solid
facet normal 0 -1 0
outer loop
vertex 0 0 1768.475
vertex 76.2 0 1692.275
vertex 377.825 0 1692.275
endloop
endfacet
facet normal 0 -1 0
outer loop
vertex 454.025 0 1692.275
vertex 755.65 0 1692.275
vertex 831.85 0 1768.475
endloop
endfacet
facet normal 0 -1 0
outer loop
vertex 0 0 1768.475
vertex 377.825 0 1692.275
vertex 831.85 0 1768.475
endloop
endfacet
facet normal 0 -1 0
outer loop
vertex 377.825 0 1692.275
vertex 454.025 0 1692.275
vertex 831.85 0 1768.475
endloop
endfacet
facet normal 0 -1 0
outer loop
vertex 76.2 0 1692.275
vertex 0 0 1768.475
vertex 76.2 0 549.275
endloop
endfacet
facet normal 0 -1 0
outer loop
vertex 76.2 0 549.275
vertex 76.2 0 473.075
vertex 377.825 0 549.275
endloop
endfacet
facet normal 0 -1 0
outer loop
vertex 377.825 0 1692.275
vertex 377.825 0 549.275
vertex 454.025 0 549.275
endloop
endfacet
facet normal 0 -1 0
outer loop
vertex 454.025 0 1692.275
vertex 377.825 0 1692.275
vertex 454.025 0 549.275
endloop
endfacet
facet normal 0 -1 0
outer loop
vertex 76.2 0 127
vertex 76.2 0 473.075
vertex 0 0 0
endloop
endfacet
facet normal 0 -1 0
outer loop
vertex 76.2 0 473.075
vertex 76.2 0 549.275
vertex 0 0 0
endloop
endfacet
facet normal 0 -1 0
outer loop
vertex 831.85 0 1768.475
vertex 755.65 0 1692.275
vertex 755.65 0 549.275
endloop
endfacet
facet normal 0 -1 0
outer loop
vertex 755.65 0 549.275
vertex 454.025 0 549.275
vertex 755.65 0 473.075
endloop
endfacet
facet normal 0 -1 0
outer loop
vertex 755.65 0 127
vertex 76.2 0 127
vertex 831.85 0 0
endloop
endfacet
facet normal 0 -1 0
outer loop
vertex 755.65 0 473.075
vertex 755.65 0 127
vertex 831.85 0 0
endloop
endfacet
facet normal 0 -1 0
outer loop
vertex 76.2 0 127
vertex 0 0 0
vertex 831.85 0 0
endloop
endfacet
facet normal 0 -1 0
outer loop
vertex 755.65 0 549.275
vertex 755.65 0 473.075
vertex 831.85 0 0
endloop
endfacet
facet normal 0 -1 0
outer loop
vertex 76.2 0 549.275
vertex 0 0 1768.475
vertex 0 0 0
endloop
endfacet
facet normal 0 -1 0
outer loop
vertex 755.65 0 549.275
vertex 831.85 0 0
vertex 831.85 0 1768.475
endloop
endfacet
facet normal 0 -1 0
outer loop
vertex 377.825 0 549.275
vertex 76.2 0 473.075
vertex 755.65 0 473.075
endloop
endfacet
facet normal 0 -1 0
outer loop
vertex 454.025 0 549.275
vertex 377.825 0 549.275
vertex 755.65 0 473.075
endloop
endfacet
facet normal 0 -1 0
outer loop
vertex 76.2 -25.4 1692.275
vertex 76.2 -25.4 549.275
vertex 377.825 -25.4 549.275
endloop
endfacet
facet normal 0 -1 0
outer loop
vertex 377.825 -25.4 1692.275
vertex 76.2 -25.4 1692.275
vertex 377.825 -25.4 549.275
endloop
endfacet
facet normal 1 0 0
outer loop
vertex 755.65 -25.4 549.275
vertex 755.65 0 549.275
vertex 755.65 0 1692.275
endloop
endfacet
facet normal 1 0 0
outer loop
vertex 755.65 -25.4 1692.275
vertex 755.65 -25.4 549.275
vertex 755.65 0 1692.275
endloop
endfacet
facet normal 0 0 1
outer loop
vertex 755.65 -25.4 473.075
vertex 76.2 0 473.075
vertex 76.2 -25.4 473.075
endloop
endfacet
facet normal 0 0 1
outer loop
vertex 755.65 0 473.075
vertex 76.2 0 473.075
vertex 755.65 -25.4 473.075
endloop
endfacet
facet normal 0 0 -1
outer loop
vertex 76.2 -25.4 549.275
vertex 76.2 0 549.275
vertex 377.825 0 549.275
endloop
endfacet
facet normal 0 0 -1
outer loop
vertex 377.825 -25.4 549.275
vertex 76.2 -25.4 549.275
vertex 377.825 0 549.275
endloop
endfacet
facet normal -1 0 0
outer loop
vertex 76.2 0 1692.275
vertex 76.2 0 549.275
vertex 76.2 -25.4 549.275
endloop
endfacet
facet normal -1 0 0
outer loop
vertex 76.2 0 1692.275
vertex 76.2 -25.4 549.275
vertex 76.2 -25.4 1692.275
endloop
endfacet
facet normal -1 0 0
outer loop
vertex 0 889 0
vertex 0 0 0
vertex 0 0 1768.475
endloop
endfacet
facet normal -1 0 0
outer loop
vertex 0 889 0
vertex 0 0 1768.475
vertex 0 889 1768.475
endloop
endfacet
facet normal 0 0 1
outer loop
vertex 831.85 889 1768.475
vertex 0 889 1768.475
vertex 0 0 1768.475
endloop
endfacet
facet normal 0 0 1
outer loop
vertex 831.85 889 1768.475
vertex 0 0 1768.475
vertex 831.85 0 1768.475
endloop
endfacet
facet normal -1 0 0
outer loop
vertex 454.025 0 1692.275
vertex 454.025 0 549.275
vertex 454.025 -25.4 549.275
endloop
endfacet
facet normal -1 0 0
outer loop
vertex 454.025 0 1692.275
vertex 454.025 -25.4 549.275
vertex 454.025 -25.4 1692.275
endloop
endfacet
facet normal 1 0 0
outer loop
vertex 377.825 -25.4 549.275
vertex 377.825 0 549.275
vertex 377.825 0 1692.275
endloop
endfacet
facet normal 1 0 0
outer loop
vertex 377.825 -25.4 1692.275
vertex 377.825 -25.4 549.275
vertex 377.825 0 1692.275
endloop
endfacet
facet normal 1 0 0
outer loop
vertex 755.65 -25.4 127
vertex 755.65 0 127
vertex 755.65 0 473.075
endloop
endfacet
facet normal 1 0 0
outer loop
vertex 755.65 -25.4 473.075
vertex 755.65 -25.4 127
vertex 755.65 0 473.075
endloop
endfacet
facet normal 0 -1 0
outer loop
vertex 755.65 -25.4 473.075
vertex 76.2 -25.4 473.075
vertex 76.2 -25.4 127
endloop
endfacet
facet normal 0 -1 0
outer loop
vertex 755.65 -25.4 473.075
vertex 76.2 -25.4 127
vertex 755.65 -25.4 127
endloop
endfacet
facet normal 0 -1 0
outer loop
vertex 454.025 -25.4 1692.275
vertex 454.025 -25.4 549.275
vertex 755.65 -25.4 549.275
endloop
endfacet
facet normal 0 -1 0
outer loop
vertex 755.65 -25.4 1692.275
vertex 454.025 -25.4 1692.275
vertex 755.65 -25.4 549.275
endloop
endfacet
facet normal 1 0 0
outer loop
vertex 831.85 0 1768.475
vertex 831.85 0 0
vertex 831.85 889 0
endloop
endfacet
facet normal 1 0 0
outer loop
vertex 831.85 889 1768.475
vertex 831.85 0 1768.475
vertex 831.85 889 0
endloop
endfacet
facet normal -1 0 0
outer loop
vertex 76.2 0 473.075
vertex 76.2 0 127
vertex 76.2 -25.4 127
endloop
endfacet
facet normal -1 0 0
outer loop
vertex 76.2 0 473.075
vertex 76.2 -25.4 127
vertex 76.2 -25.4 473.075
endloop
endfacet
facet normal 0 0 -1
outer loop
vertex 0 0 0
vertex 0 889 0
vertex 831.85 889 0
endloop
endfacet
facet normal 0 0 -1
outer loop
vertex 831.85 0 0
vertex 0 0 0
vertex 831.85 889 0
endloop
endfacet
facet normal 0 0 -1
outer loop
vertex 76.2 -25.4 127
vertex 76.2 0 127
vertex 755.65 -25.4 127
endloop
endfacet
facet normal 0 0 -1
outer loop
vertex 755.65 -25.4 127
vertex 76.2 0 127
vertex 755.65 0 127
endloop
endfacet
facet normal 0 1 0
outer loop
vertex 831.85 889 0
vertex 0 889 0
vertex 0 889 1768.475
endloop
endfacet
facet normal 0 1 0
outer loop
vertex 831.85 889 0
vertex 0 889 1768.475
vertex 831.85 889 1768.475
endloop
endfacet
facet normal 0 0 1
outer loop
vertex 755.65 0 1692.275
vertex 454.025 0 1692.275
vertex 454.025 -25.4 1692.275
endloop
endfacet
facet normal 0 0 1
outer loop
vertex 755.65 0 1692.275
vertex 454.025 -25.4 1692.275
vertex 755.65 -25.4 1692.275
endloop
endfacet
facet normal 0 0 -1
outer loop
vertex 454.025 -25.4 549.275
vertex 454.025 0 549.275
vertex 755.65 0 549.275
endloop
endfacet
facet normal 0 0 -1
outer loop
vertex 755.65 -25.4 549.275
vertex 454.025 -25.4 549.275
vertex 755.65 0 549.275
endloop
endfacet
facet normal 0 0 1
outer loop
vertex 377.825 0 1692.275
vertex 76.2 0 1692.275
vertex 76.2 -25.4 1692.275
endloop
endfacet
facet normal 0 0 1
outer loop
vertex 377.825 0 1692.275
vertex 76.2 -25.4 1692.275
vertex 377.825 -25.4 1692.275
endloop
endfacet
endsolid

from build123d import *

# Parameters (mm, degrees)
F0_W     = 831.85
F0_H     = 889
F1_DEPTH = 1768.475
F2_W     = 301.625
F2_H     = 1143
F2_W_2   = 679.45
F2_H_2   = 346.075
F3_DEPTH = 25.4


with BuildPart() as f1:
    # F0 (on Top) → F1 (new body)
    with BuildSketch(Plane.XY):
        with Locations((415.925, 444.5)):
            Rectangle(F0_W, F0_H)
    extrude(amount=F1_DEPTH)

    # F2 (on face) → F3 (join)
    with BuildSketch(Plane.XZ):
        with Locations((227.0125, 1120.775)):
            Rectangle(F2_W, F2_H)
        with Locations((604.8375, 1120.775)):
            Rectangle(F2_W, F2_H)
        with Locations((415.925, 300.0375)):
            Rectangle(F2_W_2, F2_H_2)
    extrude(amount=F3_DEPTH)


solid = f1.part
